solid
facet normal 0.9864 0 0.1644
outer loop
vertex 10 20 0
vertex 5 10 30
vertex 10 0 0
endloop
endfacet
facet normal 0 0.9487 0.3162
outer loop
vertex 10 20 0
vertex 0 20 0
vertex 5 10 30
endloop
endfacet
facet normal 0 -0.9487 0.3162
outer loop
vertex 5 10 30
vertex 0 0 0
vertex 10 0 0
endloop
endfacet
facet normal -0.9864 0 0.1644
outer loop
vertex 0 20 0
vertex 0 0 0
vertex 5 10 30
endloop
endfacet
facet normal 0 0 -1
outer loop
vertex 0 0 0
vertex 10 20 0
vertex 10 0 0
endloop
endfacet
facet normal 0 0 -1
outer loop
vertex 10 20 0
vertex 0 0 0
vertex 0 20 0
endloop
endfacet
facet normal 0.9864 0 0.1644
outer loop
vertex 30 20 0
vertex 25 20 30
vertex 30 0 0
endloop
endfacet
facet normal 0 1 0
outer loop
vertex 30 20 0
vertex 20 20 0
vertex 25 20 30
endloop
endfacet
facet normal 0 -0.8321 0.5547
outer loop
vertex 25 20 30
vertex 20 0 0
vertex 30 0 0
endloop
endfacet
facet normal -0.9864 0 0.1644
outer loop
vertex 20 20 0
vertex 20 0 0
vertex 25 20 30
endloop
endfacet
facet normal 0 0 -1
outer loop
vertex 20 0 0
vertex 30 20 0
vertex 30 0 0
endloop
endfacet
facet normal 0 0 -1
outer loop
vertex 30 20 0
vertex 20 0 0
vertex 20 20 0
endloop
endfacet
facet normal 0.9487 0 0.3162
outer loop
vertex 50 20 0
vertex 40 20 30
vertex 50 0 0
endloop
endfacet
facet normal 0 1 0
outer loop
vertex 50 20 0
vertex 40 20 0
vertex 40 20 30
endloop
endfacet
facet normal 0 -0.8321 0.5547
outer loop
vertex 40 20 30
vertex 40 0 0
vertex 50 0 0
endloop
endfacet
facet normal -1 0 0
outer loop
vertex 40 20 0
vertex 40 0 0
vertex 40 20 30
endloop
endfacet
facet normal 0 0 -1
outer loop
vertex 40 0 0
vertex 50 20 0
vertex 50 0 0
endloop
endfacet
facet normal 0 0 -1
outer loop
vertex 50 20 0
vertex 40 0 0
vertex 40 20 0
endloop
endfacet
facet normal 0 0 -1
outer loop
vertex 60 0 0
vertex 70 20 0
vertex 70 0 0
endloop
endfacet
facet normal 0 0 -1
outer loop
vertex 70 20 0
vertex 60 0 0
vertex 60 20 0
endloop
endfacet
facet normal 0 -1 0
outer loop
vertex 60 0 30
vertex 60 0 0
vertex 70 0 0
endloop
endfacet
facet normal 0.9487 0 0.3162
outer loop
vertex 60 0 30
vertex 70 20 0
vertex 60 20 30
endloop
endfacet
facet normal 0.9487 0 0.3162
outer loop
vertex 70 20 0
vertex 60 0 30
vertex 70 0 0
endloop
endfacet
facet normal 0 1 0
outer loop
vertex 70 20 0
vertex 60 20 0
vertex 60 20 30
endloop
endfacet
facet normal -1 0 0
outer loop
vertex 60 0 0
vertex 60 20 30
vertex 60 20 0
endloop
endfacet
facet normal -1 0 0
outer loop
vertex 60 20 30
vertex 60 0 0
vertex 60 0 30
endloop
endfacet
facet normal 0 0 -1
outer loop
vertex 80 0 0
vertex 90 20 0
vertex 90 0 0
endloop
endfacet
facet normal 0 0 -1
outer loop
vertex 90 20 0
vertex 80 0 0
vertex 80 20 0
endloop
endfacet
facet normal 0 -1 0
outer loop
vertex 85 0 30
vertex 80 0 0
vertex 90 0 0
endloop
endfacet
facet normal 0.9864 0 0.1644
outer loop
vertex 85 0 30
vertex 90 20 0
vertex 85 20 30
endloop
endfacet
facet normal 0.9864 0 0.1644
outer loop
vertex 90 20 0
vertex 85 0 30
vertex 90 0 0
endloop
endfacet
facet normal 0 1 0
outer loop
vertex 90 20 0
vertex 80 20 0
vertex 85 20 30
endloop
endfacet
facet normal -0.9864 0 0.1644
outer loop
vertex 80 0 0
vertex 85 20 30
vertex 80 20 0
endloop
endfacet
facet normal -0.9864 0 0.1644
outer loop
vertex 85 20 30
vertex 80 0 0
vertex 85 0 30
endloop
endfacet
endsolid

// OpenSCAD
// file: libtriangles.scad
//todo, make library work with negative lengths by adding triangles to the inside of every surface. basicaly copy and paste the current triangles set and reverse the first and last digit of every triangle. In 4 character traingles switcht the middle ones around as well.

module rightpyramid(rightpyramidx, rightpyramidy, rightpyramidz) {
	polyhedron ( points = [[0,0,0], 
			[rightpyramidx, 0, 0], 
			[0, rightpyramidy, 0], 
			[rightpyramidx, rightpyramidy, 0],
			[rightpyramidx/2, rightpyramidy, rightpyramidz]], 

	triangles = [[0,1,2],[2,1,3],[4,1,0],[3,1,4],[2,3,4],[0,2,4]]);

}

module cornerpyramid(cornerpyramidx, cornerpyramidy, cornerpyramidz) {
	polyhedron ( points = [[0,0,0], 
			[cornerpyramidx, 0, 0], 
			[0, cornerpyramidy, 0], 
			[cornerpyramidx, cornerpyramidy, 0],
			[0, cornerpyramidy, cornerpyramidz]], 

	triangles = [[0,1,2],[2,1,3],[4,1,0],[3,1,4],[2,3,4],[0,2,4]]);

}

module eqlpyramid(eqlpyramidx, eqlpyramidy, eqlpyramidz) {
	polyhedron ( points = [[0,0,0], 
			[eqlpyramidx, 0, 0], 
			[0, eqlpyramidy, 0], 
			[eqlpyramidx, eqlpyramidy, 0],
			[eqlpyramidx/2, eqlpyramidy/2, eqlpyramidz]], 

	triangles = [[0,1,2],[2,1,3],[4,1,0],[3,1,4],[2,3,4],[0,2,4]]);

}


module rightprism(rightprismx,rightprismy,rightprismz){
	polyhedron ( points = [[0,0,0],
			[rightprismx,0,0],
			[rightprismx,rightprismy,0],
			[0,rightprismy,0],
			[0,rightprismy,rightprismz],
			[0,0,rightprismz]], 
	triangles = [[0,1,2,3],[5,1,0],[5,4,2,1],[4,3,2],[0,3,4,5]]);
}



module eqlprism(rightprismx,rightprismy,rightprismz){
	polyhedron ( points = [[0,0,0],
			[rightprismx,0,0],
			[rightprismx,rightprismy,0],
			[0,rightprismy,0],
			[rightprismx/2,rightprismy,rightprismz],
			[rightprismx/2,0,rightprismz]], 
	triangles = [[0,1,2,3],[5,1,0],[5,4,2,1],[4,3,2],[0,3,4,5]]);
}
// main file
use <libtriangles.scad>;

//all of these follow the (X,Y,Z) syntax

translate(v = [0, 0, 0])eqlpyramid(10,20,30);
translate(v = [20, 0, 0]) rightpyramid(10,20,30);
translate(v = [40, 0, 0]) cornerpyramid(10,20,30);
translate(v = [60, 0, 0]) rightprism(10,20,30);
translate(v = [80, 0, 0]) eqlprism(10,20,30);
